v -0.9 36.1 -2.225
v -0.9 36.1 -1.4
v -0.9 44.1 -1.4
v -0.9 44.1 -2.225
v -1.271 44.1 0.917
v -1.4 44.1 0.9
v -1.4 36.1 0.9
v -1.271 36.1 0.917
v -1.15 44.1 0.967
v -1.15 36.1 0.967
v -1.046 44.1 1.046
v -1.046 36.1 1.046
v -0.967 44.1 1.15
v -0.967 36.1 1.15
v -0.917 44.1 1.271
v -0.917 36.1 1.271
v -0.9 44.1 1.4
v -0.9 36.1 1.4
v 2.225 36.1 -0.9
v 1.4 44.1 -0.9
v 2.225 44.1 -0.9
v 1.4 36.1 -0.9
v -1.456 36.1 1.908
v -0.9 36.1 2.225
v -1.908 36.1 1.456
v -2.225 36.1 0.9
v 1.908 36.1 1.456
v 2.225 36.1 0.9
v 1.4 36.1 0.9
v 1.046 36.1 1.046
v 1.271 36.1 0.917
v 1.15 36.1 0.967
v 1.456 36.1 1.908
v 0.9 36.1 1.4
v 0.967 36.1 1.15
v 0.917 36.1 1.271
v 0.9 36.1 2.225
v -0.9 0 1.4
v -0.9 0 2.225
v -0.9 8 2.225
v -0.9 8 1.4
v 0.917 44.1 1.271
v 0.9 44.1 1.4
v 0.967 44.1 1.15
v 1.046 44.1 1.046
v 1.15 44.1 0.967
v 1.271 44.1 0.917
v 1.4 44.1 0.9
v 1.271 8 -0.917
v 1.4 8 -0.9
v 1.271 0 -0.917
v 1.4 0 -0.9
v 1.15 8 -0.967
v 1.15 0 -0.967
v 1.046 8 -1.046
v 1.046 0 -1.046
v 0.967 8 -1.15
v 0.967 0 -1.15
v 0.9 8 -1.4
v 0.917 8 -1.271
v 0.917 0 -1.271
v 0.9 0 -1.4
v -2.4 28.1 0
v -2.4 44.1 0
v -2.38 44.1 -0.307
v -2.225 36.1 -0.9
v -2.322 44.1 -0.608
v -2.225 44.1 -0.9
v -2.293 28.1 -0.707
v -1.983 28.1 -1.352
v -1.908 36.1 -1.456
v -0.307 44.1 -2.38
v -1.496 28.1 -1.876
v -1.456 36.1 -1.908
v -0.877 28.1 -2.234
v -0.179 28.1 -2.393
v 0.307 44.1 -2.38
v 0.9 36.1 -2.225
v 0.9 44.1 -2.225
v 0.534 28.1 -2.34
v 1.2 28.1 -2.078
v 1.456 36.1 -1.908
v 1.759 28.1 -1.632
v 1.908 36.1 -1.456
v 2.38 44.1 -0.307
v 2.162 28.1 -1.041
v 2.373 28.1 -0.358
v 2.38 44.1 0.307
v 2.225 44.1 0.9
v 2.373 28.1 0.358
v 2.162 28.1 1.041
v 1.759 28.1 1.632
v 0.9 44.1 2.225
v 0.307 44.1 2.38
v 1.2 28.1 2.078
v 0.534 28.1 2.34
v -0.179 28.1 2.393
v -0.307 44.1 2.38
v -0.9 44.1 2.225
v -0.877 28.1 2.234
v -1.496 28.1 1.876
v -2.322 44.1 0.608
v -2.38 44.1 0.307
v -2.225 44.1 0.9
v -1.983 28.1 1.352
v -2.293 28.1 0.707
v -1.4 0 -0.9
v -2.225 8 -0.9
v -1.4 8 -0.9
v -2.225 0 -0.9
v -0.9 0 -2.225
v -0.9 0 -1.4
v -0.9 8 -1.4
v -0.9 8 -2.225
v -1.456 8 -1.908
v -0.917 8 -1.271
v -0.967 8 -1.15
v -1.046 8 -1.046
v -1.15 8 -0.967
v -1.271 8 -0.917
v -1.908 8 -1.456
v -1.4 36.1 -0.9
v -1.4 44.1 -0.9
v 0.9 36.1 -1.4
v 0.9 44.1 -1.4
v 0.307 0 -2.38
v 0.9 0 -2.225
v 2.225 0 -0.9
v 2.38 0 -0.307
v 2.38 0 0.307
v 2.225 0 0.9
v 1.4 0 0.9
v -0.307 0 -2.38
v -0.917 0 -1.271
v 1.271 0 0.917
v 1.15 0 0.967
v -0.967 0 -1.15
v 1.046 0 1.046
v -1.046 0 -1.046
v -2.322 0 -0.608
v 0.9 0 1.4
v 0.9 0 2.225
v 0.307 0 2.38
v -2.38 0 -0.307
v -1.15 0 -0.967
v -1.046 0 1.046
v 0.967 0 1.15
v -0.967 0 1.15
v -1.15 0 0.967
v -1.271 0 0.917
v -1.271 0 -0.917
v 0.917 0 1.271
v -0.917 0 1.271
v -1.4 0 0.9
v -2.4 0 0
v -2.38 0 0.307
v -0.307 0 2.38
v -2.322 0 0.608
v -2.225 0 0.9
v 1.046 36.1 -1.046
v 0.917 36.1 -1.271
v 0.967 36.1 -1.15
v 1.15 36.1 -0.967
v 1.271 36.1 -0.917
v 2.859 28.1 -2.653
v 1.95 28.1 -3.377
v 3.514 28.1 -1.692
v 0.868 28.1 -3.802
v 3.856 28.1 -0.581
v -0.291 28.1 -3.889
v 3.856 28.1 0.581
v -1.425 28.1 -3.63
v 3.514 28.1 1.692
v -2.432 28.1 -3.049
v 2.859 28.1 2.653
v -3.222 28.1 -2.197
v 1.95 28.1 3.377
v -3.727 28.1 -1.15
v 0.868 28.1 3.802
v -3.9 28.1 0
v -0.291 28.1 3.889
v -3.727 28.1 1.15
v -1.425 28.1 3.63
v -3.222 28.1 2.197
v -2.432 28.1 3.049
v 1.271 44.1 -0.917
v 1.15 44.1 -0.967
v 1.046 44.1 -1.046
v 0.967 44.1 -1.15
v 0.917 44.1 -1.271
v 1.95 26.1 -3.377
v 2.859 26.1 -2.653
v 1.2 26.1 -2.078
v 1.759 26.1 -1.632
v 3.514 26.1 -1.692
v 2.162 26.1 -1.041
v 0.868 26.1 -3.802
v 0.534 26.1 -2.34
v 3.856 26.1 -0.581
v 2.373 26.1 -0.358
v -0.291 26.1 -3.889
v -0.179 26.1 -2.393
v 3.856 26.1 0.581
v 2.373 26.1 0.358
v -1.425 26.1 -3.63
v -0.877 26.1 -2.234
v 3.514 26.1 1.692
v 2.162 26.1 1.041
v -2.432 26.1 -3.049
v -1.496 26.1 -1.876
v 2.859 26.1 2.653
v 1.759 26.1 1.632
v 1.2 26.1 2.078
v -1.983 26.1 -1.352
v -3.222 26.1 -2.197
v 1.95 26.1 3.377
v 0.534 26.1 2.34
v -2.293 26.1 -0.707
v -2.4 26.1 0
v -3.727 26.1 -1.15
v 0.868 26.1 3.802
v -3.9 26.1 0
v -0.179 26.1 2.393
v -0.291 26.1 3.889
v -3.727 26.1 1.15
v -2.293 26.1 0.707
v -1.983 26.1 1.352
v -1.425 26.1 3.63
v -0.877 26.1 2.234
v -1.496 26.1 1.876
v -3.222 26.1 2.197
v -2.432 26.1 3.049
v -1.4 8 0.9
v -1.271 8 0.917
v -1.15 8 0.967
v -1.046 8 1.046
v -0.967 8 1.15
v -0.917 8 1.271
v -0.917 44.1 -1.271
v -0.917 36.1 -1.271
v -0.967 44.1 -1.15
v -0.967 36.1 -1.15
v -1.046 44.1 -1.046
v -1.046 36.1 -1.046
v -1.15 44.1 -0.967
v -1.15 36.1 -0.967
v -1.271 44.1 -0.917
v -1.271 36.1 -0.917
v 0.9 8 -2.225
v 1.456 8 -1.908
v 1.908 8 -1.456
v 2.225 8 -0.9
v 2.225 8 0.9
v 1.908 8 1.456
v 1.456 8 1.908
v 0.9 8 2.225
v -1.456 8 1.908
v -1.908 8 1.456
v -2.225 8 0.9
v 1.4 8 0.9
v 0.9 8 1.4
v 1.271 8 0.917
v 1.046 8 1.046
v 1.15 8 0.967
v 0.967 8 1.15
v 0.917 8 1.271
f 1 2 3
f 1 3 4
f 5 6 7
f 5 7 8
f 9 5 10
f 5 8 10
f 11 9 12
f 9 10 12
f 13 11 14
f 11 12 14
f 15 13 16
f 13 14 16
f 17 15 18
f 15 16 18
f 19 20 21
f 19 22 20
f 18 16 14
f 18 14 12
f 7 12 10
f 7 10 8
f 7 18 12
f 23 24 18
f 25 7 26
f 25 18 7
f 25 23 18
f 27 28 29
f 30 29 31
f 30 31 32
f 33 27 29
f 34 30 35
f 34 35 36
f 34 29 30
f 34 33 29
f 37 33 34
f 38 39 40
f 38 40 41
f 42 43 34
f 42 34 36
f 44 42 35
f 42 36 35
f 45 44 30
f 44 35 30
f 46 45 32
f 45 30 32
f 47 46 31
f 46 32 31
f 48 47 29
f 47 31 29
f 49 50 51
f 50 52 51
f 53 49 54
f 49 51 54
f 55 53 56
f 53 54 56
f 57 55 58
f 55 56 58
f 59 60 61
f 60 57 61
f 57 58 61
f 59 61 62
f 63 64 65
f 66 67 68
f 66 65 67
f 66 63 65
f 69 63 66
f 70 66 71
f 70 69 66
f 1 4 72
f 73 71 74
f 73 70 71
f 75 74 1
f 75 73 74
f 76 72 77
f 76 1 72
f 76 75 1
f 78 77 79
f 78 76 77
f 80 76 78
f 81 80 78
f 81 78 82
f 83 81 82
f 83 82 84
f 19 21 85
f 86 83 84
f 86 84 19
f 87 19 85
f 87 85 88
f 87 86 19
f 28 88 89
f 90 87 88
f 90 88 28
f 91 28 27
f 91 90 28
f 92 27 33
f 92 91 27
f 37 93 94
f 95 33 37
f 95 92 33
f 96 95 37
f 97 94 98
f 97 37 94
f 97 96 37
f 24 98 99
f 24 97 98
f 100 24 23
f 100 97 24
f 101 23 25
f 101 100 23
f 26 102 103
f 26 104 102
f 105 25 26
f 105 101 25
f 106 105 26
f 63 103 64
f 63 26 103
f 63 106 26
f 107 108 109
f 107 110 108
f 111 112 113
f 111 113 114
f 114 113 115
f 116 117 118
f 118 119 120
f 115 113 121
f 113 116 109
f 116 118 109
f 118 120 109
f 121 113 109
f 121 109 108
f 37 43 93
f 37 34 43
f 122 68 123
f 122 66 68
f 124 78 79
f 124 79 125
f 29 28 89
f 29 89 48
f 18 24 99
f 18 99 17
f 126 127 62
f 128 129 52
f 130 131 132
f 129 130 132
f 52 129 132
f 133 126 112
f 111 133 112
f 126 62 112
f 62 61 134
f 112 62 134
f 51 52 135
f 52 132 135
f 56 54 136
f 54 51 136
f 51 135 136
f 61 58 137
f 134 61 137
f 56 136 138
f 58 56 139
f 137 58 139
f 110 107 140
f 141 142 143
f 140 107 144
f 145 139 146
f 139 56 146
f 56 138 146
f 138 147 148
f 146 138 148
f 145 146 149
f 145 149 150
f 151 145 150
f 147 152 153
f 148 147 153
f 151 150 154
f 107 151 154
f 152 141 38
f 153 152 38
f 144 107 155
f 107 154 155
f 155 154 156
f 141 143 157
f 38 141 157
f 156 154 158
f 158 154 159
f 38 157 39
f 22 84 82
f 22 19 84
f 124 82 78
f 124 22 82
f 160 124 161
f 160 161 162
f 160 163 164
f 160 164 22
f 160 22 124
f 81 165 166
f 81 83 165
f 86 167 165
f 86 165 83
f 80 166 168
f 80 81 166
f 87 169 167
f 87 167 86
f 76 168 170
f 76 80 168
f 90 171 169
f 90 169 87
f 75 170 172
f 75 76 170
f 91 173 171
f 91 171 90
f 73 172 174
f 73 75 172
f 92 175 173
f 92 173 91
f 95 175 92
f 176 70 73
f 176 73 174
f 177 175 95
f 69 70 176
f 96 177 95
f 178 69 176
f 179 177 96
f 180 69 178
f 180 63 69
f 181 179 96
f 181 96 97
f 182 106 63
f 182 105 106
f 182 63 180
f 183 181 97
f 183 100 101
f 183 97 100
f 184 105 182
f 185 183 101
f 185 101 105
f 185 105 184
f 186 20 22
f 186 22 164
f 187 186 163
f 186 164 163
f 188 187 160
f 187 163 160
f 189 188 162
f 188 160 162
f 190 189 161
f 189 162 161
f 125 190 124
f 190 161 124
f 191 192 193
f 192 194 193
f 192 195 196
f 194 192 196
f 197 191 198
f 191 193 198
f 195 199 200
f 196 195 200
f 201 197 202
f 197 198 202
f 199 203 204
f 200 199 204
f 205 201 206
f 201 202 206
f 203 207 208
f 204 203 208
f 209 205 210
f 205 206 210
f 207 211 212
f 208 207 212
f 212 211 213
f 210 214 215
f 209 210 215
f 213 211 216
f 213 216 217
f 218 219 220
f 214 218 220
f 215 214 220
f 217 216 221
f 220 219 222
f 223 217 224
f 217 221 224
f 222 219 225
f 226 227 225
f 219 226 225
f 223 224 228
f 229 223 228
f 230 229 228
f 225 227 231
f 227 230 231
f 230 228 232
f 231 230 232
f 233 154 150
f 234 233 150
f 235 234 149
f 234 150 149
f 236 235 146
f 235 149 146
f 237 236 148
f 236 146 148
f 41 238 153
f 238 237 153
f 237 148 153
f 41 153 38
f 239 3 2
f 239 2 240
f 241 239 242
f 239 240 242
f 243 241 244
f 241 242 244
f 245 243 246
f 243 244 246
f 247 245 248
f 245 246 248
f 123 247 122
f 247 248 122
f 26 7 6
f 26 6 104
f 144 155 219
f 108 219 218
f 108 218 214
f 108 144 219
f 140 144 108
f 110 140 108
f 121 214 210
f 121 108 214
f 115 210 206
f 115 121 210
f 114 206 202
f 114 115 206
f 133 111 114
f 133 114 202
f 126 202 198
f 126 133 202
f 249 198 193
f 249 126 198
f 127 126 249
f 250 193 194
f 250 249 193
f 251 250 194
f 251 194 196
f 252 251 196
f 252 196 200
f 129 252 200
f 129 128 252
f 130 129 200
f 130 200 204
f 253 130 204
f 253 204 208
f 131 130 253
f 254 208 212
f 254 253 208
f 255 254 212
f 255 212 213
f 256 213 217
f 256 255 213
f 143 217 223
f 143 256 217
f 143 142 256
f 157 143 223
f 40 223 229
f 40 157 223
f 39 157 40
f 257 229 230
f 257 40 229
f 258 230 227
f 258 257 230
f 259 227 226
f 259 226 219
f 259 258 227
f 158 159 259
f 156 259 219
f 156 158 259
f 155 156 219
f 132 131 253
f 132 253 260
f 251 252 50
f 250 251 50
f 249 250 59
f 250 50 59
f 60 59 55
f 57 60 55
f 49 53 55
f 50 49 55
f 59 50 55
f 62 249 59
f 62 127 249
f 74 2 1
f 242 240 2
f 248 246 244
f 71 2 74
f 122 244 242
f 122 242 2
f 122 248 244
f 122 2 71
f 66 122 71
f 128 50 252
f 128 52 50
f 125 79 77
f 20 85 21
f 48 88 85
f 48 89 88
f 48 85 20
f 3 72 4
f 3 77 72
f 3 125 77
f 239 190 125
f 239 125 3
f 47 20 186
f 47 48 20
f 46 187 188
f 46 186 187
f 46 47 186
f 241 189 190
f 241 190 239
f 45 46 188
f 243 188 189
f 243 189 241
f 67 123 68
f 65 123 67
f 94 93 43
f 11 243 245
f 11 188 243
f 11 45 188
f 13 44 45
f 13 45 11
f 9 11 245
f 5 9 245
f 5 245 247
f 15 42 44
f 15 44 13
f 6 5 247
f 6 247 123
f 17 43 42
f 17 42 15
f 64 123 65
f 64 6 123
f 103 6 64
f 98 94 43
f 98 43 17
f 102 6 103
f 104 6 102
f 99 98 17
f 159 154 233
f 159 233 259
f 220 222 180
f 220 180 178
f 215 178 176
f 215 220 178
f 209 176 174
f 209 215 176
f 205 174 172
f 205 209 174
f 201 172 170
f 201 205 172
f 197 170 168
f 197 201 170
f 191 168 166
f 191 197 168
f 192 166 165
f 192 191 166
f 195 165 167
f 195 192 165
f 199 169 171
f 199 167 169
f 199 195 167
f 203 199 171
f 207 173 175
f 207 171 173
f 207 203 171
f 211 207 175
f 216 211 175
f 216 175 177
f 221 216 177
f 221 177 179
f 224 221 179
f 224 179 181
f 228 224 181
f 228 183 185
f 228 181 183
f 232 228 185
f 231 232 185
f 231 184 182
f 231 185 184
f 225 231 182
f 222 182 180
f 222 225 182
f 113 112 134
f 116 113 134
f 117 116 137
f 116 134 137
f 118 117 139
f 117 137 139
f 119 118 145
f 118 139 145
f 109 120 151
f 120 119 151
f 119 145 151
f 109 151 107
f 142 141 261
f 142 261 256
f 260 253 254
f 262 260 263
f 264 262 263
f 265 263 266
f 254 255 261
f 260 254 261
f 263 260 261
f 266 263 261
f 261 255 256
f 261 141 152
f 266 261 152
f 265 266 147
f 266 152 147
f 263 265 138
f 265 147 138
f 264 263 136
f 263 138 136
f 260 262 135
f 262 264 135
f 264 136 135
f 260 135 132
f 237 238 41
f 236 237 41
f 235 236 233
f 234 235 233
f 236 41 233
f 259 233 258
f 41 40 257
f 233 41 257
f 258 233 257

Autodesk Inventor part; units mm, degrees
ref_plane "YZ Plane" through (0, 0, 0) normal (1, 0, 0) x (0, 1, 0)
ref_plane "XZ Plane" through (0, 0, 0) normal (0, 1, 0) x (-1, 0, 0)
ref_plane "XY Plane" through (0, 0, 0) normal (0, 0, 1) x (1, 0, 0)
sketch "Sketch1" plane through (0, 0, 0) normal (0, 1, 0) x (-1, 0, 0)
  line L0 (0.9, 2.4) -> (-0.9, 2.4)
  line L1 (0.9, 2.4) -> (0.9, 1.4)
  line L2 (1.4, 1.4) -> (0.9, 1.4) construction
  line L3 (1.4, 1.4) -> (1.4, 0.9) construction
  arc A0 (0.9, 1.4) -> (1.4, 0.9) centre (1.4, 1.4) ccw
  line L4 (1.4, 0.9) -> (2.4, 0.9)
  line L5 (-0.9, 1.4) -> (-0.9, 2.4)
  arc A1 (-1.4, 0.9) -> (-0.9, 1.4) centre (-1.4, 1.4) ccw
  line L6 (-2.4, 0.9) -> (-1.4, 0.9)
  line L7 (-2.4, 0.9) -> (-2.4, -0.9)
  line L8 (-1.4, -0.9) -> (-2.4, -0.9)
  arc A2 (-0.9, -1.4) -> (-1.4, -0.9) centre (-1.4, -1.4) ccw
  line L9 (-0.9, -2.4) -> (-0.9, -1.4)
  line L10 (-0.9, -2.4) -> (0.9, -2.4)
  line L11 (0.9, -1.4) -> (0.9, -2.4)
  arc A3 (1.4, -0.9) -> (0.9, -1.4) centre (1.4, -1.4) ccw
  line L12 (2.4, -0.9) -> (1.4, -0.9)
  line L13 (2.4, -0.9) -> (2.4, 0.9)
  line L14 (0, 2.4) -> (0, -2.4) construction
  circle A4 centre (0, 0) radius 2.4
  circle A5 centre (0, 0) radius 3.9
  point P0 (0, 0)
  point P1 (0, 0)
  point P2 (-2.4, 0)
  point P3 (2.4, 0)
  point P4 (2.2249, -0.9)
  point P5 (2.2249, 0.9)
  point P6 (0.9, 2.2249)
  point P7 (-0.9, 2.2249)
  point P8 (-2.2249, 0.9)
  point P9 (-2.2249, -0.9)
  point P10 (-0.9, -2.2249)
  point P11 (0.9, -2.2249)
  dimension "d6" = 1.8
  dimension "d7" = 2.4
  dimension "d8" = 1
  dimension "d9" = 0.5
  dimension "d10" = 1
  dimension "d11" = 360
  dimension "d12" = 2.4
  dimension "d13" = 0.9
  dimension "d16" = 4.8
  dimension "d24" = 7.8
extrude "Extrusion2" add sketch "Sketch1" along normal blind 8 contours A4 L1 A0 L4 L12 A3 L11 L9 A2 L8 L6 A1 L5
extrude "Extrusion3" add sketch "Sketch1" along normal blind 18.1 from surface at 8 contours A4 L1 A0 L4 L12 A3 L11 L9 A2 L8 L6 A1 L5 | A4 L4 A0 L1 | L5 A1 L6 A4 | A4 L11 A3 L12 | L8 A2 L9 A4
extrude "Extrusion5" add sketch "Sketch1" along normal blind 2 from surface at 26.1 contours L1 A4 L0 | A4 L5 L0 | A4 L1 A0 L4 L12 A3 L11 L9 A2 L8 L6 A1 L5 | A4 L4 A0 L1 | L5 A1 L6 A4 | L4 L13 A4 | A4 L7 L6 | L13 L12 A4 | A4 L8 L7 | A4 L11 A3 L12 | L8 A2 L9 A4 | L11 L10 A4 | A4 L10 L9 | A5
extrude "Extrusion6" add sketch "Sketch1" along normal blind 8 from surface at 28.1 contours A4 L1 A0 L4 L12 A3 L11 L9 A2 L8 L6 A1 L5 | A4 L4 A0 L1 | L5 A1 L6 A4 | A4 L11 A3 L12 | L8 A2 L9 A4
extrude "Extrusion7" add sketch "Sketch1" along normal blind 8 from surface at 36.1 contours A4 L1 A0 L4 L12 A3 L11 L9 A2 L8 L6 A1 L5
properties part number "diff_gear_holder_2"
